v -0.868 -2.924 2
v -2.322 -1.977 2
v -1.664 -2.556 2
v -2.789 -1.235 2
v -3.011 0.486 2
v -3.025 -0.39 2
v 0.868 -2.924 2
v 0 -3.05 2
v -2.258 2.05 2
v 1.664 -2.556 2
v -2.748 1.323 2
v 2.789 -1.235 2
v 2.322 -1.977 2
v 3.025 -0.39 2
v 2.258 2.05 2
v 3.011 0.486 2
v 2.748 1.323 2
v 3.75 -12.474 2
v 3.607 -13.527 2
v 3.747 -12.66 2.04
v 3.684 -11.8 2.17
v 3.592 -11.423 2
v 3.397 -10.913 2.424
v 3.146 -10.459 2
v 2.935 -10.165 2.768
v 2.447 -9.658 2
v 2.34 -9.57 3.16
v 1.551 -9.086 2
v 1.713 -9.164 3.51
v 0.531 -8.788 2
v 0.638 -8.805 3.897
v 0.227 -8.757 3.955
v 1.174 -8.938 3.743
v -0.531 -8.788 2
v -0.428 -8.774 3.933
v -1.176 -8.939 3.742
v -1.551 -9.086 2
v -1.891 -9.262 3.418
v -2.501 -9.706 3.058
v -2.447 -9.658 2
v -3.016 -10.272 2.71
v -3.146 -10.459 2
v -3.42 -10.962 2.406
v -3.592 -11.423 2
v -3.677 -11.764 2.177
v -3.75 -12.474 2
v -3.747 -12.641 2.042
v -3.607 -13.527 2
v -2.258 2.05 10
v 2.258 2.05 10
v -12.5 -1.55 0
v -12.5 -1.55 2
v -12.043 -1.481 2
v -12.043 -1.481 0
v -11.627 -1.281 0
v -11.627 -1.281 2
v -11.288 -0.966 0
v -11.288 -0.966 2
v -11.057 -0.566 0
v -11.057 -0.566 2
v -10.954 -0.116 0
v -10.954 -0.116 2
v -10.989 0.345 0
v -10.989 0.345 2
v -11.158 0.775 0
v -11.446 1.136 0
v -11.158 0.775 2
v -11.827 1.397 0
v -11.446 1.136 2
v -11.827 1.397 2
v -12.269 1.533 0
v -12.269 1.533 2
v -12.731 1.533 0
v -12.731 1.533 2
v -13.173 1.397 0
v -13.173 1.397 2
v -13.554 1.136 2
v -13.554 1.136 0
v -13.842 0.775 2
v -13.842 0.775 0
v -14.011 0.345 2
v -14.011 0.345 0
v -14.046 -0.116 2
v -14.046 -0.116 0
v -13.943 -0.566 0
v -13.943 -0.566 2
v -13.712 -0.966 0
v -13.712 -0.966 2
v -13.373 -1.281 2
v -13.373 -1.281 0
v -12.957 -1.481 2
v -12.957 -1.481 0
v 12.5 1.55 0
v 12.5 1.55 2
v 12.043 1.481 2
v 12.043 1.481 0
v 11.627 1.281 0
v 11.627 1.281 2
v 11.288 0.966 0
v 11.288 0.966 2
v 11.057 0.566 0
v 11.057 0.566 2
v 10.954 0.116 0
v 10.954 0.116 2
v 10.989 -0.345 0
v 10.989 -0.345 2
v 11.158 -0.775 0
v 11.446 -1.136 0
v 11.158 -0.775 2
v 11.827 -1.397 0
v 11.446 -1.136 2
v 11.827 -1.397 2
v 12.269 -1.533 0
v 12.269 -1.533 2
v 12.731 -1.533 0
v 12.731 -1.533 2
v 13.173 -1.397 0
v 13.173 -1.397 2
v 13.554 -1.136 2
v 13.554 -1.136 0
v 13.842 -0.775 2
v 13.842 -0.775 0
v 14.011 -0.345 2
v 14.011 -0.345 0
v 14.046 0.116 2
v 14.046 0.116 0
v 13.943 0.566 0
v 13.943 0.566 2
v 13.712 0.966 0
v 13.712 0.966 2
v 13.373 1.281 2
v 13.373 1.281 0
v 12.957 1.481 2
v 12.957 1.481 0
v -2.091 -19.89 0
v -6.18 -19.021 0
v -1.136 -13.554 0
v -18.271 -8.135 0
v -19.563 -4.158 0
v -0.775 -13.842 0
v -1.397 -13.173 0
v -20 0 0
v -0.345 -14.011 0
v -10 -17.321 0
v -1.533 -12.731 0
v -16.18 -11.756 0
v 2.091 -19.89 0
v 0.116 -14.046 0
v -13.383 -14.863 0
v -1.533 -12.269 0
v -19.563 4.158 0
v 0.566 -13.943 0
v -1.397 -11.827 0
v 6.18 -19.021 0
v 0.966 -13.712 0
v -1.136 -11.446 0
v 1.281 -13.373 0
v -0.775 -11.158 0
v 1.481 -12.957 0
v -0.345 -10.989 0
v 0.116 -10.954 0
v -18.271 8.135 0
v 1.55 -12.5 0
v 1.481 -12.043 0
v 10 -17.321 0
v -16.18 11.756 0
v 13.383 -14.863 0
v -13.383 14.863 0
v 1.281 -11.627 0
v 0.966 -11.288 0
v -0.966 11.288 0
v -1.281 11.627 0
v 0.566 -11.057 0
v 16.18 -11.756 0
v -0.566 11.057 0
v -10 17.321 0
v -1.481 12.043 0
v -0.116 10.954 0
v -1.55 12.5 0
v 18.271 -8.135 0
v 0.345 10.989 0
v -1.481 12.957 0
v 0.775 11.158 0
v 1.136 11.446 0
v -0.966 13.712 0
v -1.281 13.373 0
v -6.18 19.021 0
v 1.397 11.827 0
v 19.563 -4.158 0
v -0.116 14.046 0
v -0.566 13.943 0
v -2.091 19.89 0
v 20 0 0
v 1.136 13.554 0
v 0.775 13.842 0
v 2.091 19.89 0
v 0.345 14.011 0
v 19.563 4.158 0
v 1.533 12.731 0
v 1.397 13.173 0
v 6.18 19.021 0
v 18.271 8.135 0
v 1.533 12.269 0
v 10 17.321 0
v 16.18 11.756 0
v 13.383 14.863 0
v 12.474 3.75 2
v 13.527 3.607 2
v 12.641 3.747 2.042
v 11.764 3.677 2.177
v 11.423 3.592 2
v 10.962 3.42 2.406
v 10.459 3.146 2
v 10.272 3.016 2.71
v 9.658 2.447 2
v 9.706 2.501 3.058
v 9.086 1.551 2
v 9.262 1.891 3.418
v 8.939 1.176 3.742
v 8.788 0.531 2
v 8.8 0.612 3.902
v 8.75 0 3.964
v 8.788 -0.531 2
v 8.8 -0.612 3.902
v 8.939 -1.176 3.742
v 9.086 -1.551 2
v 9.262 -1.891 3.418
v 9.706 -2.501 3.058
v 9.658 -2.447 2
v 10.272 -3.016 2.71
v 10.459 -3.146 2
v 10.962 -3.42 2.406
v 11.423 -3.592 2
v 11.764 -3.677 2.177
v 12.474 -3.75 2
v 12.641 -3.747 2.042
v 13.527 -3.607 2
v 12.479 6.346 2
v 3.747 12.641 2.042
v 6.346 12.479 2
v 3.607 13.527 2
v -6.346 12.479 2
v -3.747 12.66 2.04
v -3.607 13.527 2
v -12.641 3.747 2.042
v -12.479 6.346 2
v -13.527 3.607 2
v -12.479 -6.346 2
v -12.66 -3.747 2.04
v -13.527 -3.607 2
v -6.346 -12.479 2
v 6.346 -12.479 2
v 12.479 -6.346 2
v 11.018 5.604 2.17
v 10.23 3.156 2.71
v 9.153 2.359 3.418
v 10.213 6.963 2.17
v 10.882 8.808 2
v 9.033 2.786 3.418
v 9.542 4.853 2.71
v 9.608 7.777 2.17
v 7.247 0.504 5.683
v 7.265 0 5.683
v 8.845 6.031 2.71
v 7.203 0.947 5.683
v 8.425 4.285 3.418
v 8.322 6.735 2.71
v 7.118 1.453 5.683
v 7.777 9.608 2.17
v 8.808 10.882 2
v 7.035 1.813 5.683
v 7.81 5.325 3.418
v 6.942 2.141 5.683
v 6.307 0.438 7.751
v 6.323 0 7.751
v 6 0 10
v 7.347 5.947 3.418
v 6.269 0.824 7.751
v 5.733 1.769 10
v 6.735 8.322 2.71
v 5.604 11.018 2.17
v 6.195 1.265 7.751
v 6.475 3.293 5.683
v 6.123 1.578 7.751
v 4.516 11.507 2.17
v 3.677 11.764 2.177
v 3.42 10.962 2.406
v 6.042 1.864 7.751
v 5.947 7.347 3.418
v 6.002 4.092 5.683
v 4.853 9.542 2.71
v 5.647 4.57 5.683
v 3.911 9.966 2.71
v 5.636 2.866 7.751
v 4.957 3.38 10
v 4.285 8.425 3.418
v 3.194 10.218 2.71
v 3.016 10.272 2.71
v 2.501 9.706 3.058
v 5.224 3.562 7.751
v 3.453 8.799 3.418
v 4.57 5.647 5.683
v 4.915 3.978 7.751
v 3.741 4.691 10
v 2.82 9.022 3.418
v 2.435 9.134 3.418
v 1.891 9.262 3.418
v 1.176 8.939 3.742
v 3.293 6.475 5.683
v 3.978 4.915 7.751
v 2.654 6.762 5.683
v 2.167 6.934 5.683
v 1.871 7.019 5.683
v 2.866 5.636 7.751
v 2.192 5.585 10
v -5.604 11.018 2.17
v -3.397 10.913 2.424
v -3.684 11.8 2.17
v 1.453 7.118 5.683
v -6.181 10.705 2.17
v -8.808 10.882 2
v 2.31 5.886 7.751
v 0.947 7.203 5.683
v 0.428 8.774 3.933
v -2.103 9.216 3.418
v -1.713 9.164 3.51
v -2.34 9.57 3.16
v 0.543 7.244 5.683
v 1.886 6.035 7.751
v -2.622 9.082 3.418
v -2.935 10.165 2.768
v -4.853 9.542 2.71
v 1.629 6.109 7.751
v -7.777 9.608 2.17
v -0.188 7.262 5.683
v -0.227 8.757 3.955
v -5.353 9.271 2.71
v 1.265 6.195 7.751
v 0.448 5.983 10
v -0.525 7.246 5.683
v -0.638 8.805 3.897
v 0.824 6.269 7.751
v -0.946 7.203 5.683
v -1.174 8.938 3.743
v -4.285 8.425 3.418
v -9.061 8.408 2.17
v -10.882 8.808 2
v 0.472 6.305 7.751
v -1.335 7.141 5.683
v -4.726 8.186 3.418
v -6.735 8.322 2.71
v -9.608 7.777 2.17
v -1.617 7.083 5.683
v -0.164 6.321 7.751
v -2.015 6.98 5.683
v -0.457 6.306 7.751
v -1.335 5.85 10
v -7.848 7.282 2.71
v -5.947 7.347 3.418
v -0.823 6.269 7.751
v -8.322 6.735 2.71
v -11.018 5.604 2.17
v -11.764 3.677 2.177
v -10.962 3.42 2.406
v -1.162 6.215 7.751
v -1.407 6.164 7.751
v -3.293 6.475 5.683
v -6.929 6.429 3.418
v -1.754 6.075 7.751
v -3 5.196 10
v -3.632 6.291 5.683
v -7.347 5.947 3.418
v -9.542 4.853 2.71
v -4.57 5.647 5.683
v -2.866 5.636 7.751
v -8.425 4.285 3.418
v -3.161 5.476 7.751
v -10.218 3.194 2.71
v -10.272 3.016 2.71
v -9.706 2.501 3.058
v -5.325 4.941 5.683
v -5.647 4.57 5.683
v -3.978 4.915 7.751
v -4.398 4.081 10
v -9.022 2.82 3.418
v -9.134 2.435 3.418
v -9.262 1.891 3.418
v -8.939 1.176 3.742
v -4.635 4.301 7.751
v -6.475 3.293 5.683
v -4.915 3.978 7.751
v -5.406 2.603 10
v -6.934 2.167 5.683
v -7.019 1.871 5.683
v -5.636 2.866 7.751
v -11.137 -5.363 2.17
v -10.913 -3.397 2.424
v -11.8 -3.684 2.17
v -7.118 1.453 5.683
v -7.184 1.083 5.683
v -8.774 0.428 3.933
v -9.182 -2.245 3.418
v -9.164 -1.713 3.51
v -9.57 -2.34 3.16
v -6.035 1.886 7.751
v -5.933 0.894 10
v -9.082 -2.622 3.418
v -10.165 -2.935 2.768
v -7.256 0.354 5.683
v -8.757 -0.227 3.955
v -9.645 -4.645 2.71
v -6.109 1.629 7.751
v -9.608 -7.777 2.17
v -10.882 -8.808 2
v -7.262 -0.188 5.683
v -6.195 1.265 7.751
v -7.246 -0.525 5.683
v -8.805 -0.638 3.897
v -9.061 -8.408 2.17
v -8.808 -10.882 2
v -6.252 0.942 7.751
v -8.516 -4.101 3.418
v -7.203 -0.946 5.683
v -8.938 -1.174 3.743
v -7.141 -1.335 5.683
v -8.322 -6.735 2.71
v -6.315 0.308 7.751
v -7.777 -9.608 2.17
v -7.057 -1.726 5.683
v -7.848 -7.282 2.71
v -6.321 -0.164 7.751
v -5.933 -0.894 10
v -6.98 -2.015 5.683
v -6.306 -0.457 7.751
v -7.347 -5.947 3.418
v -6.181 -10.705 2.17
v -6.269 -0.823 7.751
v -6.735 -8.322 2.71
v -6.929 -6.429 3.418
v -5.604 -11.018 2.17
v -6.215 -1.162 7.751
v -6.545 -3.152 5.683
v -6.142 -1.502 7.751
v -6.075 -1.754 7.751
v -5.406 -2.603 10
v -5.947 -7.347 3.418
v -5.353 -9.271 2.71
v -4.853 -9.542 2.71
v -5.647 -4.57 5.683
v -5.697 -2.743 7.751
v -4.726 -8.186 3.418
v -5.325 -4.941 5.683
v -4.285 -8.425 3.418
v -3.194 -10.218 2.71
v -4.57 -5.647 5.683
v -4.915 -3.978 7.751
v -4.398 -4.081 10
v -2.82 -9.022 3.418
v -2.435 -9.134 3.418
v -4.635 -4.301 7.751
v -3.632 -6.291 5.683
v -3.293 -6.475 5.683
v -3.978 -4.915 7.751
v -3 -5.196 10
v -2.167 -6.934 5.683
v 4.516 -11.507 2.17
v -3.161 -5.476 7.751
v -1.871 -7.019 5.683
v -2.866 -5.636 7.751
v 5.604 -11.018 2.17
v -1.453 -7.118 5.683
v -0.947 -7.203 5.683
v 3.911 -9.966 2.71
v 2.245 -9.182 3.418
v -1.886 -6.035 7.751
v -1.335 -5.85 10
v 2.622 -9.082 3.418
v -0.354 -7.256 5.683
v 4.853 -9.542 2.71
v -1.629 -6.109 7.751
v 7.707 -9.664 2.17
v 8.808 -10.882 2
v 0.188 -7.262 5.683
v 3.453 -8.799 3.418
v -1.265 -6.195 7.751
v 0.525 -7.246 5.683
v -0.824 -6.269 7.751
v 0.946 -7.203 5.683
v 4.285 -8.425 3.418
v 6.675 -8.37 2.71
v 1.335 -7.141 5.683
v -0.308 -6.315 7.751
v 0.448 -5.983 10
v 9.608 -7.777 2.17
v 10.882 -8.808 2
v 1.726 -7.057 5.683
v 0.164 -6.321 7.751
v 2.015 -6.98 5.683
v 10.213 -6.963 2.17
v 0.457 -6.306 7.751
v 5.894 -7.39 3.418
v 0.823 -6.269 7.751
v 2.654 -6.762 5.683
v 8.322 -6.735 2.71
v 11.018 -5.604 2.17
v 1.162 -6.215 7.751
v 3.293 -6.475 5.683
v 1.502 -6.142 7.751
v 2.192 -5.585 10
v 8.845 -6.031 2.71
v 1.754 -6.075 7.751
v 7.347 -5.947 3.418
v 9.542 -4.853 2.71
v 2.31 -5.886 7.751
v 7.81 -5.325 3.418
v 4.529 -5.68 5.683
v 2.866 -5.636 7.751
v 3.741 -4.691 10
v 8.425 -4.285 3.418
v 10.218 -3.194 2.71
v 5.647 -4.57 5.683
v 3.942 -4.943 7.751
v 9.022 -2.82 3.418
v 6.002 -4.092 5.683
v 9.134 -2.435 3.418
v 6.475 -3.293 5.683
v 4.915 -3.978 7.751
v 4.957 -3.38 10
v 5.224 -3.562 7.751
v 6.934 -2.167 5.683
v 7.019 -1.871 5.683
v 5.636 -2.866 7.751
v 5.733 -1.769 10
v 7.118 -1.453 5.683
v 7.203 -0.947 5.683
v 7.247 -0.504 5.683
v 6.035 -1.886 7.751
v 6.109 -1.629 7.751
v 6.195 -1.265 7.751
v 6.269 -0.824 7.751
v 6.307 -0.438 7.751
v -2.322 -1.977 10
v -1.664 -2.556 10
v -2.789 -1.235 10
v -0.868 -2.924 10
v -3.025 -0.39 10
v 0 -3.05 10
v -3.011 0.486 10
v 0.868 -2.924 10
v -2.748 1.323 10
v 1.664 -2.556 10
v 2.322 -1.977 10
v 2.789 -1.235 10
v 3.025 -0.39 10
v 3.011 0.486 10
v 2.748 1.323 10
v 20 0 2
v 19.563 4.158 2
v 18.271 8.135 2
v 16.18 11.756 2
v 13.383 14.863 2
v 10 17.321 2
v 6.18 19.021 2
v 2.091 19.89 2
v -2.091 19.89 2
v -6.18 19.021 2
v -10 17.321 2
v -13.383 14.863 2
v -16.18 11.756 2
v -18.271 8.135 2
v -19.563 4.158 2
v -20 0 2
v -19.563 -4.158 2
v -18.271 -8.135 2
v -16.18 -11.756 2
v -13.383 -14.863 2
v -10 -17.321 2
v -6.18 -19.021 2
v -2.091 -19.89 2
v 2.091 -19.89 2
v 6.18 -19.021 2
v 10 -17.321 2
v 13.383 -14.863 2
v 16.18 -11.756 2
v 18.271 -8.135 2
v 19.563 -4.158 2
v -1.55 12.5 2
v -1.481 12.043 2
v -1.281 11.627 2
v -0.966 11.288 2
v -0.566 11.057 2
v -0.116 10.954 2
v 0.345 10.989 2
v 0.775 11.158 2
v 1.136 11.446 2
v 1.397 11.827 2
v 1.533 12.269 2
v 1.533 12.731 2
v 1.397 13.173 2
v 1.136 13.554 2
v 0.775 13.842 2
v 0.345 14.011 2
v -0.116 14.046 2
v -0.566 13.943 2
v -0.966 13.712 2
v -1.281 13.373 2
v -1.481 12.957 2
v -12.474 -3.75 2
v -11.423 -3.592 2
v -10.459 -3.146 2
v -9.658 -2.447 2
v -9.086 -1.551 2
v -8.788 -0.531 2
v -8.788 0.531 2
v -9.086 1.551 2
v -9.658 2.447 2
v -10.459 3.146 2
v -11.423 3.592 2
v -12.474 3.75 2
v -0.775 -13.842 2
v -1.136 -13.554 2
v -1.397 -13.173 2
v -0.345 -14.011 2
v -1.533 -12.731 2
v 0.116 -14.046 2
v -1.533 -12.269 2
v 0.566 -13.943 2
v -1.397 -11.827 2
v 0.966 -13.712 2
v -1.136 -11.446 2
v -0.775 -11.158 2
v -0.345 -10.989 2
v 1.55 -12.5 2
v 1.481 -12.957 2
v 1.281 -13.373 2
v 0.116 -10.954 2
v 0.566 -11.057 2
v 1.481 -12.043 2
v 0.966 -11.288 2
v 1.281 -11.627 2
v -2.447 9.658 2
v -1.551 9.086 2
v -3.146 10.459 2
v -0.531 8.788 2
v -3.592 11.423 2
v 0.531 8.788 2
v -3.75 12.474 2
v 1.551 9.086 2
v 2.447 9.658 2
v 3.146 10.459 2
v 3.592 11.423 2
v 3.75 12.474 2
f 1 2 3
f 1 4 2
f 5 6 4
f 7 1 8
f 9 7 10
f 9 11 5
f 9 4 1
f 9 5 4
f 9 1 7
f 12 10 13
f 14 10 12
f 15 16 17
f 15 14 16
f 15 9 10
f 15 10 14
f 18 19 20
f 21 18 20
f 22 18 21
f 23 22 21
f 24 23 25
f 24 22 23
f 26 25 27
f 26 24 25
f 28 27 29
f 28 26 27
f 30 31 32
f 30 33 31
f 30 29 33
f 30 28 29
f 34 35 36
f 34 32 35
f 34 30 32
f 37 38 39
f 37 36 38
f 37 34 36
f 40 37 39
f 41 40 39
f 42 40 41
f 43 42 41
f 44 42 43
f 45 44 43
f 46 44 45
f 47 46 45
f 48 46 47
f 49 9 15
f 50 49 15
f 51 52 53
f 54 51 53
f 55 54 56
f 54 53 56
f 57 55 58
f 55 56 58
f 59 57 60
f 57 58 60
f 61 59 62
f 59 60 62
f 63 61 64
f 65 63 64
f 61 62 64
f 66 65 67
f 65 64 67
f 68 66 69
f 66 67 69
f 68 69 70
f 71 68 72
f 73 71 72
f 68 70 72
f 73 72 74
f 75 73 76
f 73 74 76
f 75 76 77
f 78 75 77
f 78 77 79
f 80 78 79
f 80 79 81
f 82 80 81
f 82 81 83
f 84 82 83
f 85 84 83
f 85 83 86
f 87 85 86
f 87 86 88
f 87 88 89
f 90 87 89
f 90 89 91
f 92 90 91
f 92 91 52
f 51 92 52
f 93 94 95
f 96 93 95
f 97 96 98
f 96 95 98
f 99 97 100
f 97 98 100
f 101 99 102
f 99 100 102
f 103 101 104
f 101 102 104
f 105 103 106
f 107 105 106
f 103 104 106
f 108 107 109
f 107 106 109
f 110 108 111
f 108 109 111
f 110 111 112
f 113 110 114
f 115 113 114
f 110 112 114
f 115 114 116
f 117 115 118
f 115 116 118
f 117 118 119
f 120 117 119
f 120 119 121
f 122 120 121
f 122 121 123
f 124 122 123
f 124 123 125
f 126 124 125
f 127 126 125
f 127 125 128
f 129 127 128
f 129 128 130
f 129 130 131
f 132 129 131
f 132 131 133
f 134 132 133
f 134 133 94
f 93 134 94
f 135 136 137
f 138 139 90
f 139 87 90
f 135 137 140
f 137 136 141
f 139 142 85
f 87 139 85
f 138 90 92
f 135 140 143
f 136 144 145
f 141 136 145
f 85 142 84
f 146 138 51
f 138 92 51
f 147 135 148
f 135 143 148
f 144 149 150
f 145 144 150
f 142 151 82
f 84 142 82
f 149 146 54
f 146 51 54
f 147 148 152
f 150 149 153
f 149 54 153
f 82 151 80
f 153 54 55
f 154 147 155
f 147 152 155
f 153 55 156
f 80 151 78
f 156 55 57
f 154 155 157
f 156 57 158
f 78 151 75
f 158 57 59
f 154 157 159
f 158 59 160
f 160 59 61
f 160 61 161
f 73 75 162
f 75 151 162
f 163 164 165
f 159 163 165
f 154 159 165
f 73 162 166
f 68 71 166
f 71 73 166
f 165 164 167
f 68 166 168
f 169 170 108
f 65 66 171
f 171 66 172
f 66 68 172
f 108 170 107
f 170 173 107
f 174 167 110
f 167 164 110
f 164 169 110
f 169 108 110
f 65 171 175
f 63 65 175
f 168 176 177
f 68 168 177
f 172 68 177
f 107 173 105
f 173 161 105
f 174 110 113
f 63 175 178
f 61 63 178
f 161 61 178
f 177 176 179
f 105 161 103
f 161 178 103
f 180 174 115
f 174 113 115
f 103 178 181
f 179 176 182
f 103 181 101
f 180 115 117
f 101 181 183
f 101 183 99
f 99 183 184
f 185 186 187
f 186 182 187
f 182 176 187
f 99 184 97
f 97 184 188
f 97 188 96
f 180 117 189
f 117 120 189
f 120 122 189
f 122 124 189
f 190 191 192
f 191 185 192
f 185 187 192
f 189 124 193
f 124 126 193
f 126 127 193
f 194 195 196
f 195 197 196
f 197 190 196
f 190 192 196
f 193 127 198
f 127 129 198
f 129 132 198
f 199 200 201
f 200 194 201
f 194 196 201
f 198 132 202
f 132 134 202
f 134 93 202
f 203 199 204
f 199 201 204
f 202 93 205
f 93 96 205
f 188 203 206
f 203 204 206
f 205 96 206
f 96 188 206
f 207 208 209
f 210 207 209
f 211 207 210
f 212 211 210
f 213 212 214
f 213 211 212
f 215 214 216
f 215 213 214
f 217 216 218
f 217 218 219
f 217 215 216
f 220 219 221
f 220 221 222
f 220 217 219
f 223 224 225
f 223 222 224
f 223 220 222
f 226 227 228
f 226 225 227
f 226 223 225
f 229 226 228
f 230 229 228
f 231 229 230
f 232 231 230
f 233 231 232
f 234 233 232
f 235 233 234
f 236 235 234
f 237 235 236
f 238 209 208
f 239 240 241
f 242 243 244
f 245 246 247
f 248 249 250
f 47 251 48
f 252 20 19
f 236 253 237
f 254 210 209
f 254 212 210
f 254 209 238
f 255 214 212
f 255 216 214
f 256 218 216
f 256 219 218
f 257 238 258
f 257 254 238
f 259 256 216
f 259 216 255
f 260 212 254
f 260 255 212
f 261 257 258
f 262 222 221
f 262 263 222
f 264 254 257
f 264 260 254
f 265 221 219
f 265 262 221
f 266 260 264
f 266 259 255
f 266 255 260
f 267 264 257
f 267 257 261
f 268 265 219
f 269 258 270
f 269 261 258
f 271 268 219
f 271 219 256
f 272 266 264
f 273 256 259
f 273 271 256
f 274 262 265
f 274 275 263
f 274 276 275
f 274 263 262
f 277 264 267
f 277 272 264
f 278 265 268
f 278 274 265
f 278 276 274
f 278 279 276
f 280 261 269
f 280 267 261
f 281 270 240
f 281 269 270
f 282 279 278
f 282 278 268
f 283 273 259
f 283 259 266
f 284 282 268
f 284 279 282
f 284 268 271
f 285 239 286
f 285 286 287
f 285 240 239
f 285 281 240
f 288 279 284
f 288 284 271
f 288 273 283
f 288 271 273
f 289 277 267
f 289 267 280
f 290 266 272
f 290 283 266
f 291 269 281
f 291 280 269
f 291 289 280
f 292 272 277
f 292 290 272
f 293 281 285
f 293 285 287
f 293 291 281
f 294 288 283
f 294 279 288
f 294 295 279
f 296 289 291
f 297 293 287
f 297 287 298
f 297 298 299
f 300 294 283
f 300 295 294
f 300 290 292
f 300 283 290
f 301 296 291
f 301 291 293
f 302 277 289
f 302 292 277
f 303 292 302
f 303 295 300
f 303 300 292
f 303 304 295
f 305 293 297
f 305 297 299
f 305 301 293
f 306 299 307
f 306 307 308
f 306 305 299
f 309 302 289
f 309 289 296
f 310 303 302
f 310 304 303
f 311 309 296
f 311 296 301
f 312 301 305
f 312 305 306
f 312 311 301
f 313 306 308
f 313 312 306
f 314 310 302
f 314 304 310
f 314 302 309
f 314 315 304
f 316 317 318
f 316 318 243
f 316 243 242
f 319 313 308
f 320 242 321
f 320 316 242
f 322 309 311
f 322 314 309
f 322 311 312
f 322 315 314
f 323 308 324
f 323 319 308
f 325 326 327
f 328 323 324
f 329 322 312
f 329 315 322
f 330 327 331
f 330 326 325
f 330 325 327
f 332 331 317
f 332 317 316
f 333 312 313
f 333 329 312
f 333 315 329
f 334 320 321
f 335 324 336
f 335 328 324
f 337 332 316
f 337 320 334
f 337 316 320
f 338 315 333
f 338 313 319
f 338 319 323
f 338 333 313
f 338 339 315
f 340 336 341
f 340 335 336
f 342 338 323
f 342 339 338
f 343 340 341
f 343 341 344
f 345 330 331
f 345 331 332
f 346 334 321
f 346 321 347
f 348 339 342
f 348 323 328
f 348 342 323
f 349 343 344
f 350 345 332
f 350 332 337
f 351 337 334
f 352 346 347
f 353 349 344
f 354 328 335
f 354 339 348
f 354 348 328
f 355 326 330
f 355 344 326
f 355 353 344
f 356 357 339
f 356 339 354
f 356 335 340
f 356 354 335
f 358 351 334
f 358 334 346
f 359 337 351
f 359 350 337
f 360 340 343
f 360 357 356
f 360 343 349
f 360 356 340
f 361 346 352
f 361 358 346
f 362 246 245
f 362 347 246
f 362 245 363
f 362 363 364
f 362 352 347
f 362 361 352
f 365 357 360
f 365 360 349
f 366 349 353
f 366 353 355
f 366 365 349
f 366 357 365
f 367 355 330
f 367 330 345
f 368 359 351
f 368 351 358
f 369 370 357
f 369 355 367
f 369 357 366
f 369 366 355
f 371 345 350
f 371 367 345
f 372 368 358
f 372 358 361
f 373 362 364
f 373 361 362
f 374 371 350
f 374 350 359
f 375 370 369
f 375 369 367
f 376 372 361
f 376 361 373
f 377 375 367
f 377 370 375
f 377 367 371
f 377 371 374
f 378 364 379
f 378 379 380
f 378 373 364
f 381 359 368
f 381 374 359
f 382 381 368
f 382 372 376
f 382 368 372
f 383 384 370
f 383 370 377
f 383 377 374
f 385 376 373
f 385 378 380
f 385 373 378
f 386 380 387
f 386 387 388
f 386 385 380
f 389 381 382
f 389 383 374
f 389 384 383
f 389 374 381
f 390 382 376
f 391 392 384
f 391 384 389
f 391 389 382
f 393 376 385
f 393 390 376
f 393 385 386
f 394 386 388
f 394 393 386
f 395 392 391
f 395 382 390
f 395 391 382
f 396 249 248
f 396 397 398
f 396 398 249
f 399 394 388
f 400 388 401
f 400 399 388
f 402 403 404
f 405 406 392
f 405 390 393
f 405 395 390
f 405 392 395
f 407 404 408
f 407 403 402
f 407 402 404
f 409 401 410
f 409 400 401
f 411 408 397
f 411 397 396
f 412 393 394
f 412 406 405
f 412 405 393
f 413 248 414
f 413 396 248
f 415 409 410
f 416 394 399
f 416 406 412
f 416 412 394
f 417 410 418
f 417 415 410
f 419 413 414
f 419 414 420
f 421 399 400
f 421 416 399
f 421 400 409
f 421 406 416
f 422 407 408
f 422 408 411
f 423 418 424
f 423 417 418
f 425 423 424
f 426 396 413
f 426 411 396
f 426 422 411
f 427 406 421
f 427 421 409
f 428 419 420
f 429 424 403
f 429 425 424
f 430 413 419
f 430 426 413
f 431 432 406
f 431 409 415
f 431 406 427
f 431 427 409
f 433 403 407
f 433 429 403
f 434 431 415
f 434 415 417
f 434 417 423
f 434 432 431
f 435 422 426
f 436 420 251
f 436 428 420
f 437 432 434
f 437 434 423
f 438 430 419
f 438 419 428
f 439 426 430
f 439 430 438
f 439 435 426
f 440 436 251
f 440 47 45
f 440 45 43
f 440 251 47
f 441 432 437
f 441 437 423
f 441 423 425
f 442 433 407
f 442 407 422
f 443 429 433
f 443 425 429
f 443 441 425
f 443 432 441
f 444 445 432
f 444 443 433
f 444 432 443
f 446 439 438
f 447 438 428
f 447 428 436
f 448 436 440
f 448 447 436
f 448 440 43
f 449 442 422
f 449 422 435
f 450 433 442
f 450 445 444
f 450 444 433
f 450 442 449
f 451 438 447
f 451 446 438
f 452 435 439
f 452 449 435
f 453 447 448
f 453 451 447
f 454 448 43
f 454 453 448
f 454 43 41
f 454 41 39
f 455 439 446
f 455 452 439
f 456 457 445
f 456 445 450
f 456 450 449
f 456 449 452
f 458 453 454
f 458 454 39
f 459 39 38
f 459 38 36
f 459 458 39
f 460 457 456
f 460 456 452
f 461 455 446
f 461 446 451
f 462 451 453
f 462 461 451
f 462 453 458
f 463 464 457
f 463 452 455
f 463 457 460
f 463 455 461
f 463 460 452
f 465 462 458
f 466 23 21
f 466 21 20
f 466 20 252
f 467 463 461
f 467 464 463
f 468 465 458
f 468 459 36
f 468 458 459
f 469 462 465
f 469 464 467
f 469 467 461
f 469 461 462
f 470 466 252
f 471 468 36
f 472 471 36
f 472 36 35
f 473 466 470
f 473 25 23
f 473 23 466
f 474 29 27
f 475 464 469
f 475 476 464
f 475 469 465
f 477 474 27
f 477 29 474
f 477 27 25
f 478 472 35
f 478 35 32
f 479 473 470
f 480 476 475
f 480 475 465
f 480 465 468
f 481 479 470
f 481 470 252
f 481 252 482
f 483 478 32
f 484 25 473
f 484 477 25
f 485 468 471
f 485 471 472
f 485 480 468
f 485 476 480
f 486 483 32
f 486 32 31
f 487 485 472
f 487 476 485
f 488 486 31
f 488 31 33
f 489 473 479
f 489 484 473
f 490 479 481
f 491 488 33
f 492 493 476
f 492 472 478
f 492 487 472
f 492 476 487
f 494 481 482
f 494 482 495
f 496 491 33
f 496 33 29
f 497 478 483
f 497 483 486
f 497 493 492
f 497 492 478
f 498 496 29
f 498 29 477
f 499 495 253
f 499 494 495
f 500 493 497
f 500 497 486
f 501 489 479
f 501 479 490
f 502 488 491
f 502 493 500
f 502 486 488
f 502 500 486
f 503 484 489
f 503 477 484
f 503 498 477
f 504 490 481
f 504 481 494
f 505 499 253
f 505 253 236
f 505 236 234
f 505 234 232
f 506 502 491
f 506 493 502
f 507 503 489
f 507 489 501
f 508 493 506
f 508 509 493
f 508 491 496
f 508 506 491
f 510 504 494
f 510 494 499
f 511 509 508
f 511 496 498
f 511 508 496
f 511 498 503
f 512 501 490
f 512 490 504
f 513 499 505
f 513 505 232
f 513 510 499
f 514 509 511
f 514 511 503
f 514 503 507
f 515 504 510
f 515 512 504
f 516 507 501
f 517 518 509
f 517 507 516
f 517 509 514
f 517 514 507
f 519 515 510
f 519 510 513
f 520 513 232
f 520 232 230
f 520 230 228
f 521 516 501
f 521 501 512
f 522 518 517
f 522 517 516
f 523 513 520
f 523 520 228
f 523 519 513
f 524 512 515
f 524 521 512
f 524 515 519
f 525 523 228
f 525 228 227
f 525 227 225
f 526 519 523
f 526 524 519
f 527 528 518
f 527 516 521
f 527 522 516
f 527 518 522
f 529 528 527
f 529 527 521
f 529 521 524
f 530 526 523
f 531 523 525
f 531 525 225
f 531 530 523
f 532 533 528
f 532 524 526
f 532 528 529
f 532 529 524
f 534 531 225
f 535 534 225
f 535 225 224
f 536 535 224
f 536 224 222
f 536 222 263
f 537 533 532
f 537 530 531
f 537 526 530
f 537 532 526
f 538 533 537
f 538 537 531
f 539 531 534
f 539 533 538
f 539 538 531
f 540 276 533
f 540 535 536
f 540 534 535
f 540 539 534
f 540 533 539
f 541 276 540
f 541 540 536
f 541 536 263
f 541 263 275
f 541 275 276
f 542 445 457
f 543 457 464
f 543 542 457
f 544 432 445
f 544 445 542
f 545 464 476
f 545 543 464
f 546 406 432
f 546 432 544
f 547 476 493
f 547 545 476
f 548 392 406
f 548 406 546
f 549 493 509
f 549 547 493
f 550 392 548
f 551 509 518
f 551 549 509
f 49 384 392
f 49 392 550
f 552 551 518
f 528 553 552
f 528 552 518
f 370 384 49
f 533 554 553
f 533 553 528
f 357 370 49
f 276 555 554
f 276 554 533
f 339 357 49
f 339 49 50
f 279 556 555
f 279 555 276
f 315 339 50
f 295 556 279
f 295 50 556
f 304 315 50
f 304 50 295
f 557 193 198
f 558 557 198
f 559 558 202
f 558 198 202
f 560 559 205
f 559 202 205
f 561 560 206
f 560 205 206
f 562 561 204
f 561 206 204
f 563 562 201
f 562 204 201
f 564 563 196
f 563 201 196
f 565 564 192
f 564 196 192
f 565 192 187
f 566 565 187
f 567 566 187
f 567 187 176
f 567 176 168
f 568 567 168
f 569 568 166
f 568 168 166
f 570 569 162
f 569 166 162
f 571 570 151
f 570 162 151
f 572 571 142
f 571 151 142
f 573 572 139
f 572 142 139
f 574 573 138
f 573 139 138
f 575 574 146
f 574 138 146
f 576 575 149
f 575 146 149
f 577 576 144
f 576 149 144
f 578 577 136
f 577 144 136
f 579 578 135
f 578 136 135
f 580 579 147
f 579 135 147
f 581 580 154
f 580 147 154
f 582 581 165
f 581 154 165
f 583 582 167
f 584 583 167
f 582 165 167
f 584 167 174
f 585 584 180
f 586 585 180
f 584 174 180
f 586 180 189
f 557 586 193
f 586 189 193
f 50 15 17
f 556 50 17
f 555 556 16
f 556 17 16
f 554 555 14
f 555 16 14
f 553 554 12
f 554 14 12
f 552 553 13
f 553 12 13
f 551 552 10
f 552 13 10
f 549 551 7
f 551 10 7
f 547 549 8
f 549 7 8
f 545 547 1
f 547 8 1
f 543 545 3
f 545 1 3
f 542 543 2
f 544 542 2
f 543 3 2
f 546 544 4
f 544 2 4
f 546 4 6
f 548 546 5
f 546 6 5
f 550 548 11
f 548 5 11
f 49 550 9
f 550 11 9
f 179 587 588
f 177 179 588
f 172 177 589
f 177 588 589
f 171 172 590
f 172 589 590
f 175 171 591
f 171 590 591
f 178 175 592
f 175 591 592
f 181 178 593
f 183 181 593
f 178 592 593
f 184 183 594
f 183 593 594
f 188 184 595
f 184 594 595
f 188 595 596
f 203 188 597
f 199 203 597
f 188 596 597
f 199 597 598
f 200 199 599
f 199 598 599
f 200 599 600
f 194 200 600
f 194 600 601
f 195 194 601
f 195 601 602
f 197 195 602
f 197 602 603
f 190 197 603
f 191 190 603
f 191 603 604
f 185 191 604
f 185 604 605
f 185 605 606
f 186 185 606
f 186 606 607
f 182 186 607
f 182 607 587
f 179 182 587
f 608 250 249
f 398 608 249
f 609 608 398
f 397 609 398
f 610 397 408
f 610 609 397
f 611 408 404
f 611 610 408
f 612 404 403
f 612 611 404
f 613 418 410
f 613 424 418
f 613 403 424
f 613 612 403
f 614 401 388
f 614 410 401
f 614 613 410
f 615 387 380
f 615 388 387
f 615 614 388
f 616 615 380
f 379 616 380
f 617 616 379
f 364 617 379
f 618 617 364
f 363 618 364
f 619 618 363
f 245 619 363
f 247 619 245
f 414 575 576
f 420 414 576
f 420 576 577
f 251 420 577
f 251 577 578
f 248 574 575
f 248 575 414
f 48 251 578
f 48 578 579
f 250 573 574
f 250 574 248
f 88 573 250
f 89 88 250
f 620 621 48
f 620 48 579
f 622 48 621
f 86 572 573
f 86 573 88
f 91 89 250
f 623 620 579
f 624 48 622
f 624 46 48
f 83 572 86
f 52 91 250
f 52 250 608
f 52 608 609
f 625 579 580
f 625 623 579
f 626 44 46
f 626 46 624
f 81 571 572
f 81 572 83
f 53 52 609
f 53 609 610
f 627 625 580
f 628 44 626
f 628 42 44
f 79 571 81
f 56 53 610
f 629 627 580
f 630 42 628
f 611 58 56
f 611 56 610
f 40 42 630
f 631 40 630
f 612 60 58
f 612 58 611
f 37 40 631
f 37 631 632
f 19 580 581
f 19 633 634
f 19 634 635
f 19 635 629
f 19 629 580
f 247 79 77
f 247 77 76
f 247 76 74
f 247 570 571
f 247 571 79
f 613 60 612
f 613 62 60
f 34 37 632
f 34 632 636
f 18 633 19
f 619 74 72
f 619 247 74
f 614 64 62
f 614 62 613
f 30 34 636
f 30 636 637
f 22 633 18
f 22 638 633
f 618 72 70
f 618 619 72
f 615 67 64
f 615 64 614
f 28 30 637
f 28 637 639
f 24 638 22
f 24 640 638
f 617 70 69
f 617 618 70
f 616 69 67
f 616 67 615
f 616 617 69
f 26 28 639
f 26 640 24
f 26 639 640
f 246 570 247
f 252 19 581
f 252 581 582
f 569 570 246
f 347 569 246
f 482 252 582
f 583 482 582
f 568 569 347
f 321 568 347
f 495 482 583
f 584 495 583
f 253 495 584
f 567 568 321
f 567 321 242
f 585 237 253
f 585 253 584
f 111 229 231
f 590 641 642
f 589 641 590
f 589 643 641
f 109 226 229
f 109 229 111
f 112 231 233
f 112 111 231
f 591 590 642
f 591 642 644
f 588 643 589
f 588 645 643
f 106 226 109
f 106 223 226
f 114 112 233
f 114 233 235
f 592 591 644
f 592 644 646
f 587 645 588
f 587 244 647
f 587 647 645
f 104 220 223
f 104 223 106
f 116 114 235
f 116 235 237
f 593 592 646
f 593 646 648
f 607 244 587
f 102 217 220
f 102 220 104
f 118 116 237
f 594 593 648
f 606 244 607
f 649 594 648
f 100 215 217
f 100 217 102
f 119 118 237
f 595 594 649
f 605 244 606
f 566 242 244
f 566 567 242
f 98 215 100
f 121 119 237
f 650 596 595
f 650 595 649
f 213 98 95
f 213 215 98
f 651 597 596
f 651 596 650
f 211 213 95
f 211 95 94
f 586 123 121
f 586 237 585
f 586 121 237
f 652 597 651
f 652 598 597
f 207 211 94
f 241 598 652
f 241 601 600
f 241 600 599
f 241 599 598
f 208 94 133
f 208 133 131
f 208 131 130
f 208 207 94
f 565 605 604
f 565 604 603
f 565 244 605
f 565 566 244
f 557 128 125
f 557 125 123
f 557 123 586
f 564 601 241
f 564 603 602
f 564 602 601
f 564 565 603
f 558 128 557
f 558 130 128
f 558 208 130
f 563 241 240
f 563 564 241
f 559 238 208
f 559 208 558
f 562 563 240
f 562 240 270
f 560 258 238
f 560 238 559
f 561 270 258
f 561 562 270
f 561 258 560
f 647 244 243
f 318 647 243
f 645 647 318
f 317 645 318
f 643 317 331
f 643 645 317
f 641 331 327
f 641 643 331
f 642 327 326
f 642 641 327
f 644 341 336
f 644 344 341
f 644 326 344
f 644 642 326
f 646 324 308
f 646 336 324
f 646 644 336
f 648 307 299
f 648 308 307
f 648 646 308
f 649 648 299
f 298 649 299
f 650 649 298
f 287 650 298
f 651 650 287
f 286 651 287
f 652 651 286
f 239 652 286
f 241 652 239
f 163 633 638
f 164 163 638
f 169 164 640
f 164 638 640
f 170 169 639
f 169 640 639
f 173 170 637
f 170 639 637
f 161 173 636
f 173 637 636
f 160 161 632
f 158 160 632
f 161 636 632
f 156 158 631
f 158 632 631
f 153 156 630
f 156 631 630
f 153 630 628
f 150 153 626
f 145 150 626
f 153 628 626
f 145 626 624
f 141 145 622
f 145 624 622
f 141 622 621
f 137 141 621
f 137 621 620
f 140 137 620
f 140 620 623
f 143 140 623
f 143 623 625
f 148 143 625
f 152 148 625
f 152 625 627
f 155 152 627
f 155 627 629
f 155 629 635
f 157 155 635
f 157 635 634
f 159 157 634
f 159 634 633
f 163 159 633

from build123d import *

# Parameters (mm, degrees)
ESBO_O1_R                = 20
RESSALTO_EXTRUS_O1_DEPTH = 2
ESBO_O2_R                = 6
RESSALTO_EXTRUS_O2_DEPTH = 8
FILETE3_R                = 8
ESBO_O3_R                = 1.55
CORTE_EXTRUS_O1_DEPTH    = 30.393876913
PADR_OCIRCULAR1_COUNT    = 4
ESBO_O5_R                = 3.75
CORTE_EXTRUS_O2_DEPTH    = 6
PADR_OCIRCULAR2_COUNT    = 4


with BuildPart() as part:
    # Esboço1 → Ressalto-extrusão1 (new body)
    with BuildSketch(Plane.XY):
        Circle(ESBO_O1_R)
    extrude(amount=RESSALTO_EXTRUS_O1_DEPTH)

    # Esboço2 → Ressalto-extrusão2 (add)
    with BuildSketch(Plane.XY.offset(2)):
        Circle(ESBO_O2_R)
        with BuildLine():
            Line((-2.258317958, 2.05), (2.258317958, 2.05))
            ThreePointArc((2.258317958, 2.05), (0, -3.05), (-2.258317958, 2.05))
        make_face(mode=Mode.SUBTRACT)
    extrude(amount=RESSALTO_EXTRUS_O2_DEPTH)

    # Filete3
    filete3_edges = [part.edges().sort_by_distance(p)[0] for p in [
        (-6, 0, 2),
    ]]
    fillet(filete3_edges, radius=FILETE3_R - 0.0001)  # a hair under: the kernel refuses the full size

    # Esboço3 → Corte-extrusão1 (cut, through all)
    with BuildSketch(Plane.XY.offset(2)):
        with Locations((0, -12.5)):
            Circle(ESBO_O3_R)
    corte_extrus_o1 = extrude(amount=-CORTE_EXTRUS_O1_DEPTH, mode=Mode.SUBTRACT)

    # PadrãoCircular1: Corte-extrusão1 ×4 about axis
    padr_ocircular1_axis = Axis((0, 0, 0), (0, 0, 1))
    for i in range(1, PADR_OCIRCULAR1_COUNT):
        add(corte_extrus_o1.rotate(padr_ocircular1_axis, i * 360 / PADR_OCIRCULAR1_COUNT), mode=Mode.SUBTRACT)

    # Esboço5 → Corte-extrusão2 (cut)
    with BuildSketch(Plane.XY.offset(2)):
        with Locations((12.5, 0)):
            Circle(ESBO_O5_R)
    corte_extrus_o2 = extrude(amount=CORTE_EXTRUS_O2_DEPTH, mode=Mode.SUBTRACT)

    # PadrãoCircular2: Corte-extrusão2 ×4 about axis
    padr_ocircular2_axis = Axis((0, 0, 0), (0, 0, 1))
    for i in range(1, PADR_OCIRCULAR2_COUNT):
        add(corte_extrus_o2.rotate(padr_ocircular2_axis, i * 360 / PADR_OCIRCULAR2_COUNT), mode=Mode.SUBTRACT)


solid = part.part
